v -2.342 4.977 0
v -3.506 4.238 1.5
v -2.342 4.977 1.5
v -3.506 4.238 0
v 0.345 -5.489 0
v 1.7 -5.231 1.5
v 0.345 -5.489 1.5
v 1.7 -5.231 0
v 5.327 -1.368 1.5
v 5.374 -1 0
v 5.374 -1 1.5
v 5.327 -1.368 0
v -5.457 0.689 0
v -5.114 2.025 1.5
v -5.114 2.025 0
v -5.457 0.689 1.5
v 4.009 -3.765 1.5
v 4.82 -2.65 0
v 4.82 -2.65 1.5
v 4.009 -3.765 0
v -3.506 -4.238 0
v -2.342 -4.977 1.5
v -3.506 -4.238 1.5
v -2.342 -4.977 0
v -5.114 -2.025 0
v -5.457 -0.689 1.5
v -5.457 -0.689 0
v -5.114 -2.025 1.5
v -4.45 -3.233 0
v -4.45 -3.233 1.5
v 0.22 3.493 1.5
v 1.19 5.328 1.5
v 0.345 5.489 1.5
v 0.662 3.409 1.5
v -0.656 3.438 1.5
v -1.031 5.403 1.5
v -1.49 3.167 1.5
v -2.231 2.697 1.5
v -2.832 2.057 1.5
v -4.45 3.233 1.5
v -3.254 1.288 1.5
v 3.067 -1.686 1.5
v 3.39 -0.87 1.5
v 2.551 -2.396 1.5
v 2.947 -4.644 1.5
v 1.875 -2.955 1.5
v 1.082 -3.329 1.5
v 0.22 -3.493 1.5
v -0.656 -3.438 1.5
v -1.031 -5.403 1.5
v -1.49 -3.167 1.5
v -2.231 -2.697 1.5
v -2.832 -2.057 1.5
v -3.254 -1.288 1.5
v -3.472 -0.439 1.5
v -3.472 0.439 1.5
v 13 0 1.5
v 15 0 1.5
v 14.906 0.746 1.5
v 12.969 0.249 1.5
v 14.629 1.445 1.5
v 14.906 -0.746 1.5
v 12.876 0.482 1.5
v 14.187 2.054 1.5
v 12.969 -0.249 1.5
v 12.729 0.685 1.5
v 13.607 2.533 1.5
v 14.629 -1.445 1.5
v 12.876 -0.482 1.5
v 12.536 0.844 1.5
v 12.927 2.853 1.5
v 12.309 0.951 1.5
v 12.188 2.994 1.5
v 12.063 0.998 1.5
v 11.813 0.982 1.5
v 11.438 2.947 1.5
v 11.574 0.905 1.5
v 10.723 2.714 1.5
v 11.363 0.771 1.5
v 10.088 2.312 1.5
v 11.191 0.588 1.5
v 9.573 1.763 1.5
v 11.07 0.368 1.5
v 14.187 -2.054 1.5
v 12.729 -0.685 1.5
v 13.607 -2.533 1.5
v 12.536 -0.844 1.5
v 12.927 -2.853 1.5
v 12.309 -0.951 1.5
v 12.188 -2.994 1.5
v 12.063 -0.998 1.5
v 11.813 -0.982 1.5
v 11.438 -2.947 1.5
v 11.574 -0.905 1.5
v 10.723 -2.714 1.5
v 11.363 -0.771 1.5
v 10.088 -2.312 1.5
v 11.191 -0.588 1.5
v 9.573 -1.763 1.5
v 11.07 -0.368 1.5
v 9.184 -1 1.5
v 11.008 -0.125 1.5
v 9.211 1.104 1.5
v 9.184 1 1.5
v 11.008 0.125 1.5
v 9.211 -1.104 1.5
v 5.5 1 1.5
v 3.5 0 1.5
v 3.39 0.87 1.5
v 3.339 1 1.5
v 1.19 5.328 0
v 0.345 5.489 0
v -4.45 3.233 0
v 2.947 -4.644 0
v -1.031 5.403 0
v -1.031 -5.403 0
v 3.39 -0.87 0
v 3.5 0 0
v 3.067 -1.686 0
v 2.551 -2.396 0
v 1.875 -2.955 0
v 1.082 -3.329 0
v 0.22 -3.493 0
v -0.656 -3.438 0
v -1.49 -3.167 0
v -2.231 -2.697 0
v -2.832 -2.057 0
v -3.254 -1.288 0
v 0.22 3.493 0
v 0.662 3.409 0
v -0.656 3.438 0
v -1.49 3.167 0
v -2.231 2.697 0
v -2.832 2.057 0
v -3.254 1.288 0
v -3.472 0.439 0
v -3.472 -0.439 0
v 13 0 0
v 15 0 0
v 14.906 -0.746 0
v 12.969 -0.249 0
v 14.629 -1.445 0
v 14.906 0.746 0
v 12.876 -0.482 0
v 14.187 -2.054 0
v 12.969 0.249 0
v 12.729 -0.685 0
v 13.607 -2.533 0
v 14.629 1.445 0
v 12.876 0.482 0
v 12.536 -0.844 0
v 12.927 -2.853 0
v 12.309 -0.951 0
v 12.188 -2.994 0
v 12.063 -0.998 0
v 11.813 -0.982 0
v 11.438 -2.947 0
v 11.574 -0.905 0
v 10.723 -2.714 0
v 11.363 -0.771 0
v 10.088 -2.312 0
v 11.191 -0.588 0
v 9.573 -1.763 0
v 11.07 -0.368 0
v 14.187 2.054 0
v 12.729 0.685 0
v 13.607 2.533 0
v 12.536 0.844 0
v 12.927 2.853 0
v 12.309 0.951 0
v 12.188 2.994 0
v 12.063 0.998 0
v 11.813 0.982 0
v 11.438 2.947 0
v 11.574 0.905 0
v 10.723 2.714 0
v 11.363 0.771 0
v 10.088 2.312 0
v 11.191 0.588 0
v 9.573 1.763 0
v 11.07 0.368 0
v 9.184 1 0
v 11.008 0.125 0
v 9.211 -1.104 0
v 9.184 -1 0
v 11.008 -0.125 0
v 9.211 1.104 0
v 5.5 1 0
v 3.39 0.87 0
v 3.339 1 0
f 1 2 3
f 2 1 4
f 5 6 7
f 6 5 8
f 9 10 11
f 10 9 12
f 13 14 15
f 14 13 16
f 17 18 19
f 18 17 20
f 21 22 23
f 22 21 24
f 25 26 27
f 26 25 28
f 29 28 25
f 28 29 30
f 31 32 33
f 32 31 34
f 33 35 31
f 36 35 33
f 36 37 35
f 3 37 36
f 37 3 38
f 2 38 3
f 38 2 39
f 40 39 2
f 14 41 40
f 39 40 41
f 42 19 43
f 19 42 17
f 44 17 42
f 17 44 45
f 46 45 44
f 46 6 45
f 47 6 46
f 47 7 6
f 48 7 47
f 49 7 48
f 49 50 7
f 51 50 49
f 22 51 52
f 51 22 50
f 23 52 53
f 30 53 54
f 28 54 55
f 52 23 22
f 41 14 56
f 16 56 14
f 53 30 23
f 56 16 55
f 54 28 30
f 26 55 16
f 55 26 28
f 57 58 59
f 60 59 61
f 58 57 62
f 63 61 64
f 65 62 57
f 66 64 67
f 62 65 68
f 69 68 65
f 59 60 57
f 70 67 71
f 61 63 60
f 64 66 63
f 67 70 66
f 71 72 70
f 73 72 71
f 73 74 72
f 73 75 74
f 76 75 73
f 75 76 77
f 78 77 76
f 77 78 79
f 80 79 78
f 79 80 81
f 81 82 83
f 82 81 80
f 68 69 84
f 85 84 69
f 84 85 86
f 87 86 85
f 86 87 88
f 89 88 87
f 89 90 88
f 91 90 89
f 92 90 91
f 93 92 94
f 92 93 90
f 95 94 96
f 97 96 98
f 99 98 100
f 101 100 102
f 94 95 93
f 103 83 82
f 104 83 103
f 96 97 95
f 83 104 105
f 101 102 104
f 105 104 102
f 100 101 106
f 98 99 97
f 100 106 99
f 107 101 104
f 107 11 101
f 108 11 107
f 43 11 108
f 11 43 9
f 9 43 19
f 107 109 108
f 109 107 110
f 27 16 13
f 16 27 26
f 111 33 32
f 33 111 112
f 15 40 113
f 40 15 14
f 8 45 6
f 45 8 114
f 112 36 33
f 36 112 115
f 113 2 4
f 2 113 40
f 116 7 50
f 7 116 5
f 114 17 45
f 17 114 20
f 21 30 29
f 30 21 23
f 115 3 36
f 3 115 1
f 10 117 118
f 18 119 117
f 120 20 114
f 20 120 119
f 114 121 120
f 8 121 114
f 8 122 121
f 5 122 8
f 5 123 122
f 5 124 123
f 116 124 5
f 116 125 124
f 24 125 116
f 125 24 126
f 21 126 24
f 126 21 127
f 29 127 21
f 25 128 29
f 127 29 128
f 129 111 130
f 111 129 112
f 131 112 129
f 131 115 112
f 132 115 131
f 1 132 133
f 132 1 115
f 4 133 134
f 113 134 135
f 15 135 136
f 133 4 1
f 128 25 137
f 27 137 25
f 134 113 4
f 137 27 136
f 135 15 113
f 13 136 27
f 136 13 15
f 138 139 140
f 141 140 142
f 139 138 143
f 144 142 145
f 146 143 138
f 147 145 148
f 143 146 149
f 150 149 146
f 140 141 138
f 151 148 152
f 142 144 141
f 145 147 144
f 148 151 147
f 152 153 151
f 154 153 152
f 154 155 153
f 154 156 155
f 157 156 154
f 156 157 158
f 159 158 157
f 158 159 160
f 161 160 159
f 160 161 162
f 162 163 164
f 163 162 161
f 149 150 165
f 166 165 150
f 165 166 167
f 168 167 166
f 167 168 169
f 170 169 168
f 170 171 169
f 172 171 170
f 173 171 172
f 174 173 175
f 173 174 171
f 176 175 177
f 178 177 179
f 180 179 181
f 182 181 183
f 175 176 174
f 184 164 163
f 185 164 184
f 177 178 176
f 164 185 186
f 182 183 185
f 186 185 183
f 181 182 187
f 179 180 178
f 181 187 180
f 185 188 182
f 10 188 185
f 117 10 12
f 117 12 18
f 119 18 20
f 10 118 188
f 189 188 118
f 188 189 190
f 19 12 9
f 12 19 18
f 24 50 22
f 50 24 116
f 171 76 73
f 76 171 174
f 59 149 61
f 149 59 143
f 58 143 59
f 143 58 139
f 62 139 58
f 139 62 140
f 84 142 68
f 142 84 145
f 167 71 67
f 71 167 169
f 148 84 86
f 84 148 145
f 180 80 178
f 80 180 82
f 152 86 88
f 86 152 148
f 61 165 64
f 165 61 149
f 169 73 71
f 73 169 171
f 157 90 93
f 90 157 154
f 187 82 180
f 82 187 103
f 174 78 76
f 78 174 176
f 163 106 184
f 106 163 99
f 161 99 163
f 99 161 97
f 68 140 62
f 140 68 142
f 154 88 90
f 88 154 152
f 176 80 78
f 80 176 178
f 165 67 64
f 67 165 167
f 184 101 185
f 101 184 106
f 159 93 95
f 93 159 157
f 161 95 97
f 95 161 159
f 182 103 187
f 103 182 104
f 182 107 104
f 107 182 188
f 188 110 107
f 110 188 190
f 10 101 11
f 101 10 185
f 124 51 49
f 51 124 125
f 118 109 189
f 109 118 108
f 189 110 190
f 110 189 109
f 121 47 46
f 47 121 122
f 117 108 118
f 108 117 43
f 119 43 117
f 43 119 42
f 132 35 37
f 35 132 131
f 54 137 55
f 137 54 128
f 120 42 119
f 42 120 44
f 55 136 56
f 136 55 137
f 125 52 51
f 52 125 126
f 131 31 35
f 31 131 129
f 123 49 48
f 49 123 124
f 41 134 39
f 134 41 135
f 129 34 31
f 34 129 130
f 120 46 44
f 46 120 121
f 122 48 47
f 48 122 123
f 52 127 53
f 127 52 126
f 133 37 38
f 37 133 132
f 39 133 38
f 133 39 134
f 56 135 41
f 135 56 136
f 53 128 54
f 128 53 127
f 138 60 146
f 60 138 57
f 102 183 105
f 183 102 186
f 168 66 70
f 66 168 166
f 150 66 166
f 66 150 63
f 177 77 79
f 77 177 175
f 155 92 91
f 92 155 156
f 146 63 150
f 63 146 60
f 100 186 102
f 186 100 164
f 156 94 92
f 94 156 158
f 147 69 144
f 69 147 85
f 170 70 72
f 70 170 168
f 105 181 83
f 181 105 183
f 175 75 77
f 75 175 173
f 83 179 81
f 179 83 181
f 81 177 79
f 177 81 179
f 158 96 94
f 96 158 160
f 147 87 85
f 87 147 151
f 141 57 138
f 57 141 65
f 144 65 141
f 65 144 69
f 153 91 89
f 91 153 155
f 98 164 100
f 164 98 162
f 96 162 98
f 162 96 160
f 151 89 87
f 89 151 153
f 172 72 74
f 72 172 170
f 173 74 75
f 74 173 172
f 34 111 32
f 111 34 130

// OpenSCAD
include <MCAD/triangles.scad>

$fn=25;

wall_thk = 2;

ring_id = 7;
ring_od = ring_id + 2*wall_thk;

string_hole_id = 2;
string_hole_od = string_hole_id + 2*wall_thk;

thk = 1.5;
hole_centres = 12;

l_neck = hole_centres - ring_od/2 - string_hole_od/2;
echo(l_neck);
wall_tol = wall_thk/2;

difference()
{
union()
{
    cylinder(d=ring_od,h=thk);
    translate([hole_centres,0,0])
    cylinder(d=string_hole_od,h=thk);
        translate([ring_od/2-wall_thk/2,-wall_thk/2,0])
        cube([l_neck+wall_thk,wall_thk,thk]);


}

    //holes
    cylinder(d=ring_id,h=thk);
    translate([hole_centres,0,0])
        cylinder(d=string_hole_id,h=thk);
    //cutout
    translate([ring_od/2,wall_thk/2,0])
        rotate([0,0,90])
            triangle(ring_od/2,20,10);
}
